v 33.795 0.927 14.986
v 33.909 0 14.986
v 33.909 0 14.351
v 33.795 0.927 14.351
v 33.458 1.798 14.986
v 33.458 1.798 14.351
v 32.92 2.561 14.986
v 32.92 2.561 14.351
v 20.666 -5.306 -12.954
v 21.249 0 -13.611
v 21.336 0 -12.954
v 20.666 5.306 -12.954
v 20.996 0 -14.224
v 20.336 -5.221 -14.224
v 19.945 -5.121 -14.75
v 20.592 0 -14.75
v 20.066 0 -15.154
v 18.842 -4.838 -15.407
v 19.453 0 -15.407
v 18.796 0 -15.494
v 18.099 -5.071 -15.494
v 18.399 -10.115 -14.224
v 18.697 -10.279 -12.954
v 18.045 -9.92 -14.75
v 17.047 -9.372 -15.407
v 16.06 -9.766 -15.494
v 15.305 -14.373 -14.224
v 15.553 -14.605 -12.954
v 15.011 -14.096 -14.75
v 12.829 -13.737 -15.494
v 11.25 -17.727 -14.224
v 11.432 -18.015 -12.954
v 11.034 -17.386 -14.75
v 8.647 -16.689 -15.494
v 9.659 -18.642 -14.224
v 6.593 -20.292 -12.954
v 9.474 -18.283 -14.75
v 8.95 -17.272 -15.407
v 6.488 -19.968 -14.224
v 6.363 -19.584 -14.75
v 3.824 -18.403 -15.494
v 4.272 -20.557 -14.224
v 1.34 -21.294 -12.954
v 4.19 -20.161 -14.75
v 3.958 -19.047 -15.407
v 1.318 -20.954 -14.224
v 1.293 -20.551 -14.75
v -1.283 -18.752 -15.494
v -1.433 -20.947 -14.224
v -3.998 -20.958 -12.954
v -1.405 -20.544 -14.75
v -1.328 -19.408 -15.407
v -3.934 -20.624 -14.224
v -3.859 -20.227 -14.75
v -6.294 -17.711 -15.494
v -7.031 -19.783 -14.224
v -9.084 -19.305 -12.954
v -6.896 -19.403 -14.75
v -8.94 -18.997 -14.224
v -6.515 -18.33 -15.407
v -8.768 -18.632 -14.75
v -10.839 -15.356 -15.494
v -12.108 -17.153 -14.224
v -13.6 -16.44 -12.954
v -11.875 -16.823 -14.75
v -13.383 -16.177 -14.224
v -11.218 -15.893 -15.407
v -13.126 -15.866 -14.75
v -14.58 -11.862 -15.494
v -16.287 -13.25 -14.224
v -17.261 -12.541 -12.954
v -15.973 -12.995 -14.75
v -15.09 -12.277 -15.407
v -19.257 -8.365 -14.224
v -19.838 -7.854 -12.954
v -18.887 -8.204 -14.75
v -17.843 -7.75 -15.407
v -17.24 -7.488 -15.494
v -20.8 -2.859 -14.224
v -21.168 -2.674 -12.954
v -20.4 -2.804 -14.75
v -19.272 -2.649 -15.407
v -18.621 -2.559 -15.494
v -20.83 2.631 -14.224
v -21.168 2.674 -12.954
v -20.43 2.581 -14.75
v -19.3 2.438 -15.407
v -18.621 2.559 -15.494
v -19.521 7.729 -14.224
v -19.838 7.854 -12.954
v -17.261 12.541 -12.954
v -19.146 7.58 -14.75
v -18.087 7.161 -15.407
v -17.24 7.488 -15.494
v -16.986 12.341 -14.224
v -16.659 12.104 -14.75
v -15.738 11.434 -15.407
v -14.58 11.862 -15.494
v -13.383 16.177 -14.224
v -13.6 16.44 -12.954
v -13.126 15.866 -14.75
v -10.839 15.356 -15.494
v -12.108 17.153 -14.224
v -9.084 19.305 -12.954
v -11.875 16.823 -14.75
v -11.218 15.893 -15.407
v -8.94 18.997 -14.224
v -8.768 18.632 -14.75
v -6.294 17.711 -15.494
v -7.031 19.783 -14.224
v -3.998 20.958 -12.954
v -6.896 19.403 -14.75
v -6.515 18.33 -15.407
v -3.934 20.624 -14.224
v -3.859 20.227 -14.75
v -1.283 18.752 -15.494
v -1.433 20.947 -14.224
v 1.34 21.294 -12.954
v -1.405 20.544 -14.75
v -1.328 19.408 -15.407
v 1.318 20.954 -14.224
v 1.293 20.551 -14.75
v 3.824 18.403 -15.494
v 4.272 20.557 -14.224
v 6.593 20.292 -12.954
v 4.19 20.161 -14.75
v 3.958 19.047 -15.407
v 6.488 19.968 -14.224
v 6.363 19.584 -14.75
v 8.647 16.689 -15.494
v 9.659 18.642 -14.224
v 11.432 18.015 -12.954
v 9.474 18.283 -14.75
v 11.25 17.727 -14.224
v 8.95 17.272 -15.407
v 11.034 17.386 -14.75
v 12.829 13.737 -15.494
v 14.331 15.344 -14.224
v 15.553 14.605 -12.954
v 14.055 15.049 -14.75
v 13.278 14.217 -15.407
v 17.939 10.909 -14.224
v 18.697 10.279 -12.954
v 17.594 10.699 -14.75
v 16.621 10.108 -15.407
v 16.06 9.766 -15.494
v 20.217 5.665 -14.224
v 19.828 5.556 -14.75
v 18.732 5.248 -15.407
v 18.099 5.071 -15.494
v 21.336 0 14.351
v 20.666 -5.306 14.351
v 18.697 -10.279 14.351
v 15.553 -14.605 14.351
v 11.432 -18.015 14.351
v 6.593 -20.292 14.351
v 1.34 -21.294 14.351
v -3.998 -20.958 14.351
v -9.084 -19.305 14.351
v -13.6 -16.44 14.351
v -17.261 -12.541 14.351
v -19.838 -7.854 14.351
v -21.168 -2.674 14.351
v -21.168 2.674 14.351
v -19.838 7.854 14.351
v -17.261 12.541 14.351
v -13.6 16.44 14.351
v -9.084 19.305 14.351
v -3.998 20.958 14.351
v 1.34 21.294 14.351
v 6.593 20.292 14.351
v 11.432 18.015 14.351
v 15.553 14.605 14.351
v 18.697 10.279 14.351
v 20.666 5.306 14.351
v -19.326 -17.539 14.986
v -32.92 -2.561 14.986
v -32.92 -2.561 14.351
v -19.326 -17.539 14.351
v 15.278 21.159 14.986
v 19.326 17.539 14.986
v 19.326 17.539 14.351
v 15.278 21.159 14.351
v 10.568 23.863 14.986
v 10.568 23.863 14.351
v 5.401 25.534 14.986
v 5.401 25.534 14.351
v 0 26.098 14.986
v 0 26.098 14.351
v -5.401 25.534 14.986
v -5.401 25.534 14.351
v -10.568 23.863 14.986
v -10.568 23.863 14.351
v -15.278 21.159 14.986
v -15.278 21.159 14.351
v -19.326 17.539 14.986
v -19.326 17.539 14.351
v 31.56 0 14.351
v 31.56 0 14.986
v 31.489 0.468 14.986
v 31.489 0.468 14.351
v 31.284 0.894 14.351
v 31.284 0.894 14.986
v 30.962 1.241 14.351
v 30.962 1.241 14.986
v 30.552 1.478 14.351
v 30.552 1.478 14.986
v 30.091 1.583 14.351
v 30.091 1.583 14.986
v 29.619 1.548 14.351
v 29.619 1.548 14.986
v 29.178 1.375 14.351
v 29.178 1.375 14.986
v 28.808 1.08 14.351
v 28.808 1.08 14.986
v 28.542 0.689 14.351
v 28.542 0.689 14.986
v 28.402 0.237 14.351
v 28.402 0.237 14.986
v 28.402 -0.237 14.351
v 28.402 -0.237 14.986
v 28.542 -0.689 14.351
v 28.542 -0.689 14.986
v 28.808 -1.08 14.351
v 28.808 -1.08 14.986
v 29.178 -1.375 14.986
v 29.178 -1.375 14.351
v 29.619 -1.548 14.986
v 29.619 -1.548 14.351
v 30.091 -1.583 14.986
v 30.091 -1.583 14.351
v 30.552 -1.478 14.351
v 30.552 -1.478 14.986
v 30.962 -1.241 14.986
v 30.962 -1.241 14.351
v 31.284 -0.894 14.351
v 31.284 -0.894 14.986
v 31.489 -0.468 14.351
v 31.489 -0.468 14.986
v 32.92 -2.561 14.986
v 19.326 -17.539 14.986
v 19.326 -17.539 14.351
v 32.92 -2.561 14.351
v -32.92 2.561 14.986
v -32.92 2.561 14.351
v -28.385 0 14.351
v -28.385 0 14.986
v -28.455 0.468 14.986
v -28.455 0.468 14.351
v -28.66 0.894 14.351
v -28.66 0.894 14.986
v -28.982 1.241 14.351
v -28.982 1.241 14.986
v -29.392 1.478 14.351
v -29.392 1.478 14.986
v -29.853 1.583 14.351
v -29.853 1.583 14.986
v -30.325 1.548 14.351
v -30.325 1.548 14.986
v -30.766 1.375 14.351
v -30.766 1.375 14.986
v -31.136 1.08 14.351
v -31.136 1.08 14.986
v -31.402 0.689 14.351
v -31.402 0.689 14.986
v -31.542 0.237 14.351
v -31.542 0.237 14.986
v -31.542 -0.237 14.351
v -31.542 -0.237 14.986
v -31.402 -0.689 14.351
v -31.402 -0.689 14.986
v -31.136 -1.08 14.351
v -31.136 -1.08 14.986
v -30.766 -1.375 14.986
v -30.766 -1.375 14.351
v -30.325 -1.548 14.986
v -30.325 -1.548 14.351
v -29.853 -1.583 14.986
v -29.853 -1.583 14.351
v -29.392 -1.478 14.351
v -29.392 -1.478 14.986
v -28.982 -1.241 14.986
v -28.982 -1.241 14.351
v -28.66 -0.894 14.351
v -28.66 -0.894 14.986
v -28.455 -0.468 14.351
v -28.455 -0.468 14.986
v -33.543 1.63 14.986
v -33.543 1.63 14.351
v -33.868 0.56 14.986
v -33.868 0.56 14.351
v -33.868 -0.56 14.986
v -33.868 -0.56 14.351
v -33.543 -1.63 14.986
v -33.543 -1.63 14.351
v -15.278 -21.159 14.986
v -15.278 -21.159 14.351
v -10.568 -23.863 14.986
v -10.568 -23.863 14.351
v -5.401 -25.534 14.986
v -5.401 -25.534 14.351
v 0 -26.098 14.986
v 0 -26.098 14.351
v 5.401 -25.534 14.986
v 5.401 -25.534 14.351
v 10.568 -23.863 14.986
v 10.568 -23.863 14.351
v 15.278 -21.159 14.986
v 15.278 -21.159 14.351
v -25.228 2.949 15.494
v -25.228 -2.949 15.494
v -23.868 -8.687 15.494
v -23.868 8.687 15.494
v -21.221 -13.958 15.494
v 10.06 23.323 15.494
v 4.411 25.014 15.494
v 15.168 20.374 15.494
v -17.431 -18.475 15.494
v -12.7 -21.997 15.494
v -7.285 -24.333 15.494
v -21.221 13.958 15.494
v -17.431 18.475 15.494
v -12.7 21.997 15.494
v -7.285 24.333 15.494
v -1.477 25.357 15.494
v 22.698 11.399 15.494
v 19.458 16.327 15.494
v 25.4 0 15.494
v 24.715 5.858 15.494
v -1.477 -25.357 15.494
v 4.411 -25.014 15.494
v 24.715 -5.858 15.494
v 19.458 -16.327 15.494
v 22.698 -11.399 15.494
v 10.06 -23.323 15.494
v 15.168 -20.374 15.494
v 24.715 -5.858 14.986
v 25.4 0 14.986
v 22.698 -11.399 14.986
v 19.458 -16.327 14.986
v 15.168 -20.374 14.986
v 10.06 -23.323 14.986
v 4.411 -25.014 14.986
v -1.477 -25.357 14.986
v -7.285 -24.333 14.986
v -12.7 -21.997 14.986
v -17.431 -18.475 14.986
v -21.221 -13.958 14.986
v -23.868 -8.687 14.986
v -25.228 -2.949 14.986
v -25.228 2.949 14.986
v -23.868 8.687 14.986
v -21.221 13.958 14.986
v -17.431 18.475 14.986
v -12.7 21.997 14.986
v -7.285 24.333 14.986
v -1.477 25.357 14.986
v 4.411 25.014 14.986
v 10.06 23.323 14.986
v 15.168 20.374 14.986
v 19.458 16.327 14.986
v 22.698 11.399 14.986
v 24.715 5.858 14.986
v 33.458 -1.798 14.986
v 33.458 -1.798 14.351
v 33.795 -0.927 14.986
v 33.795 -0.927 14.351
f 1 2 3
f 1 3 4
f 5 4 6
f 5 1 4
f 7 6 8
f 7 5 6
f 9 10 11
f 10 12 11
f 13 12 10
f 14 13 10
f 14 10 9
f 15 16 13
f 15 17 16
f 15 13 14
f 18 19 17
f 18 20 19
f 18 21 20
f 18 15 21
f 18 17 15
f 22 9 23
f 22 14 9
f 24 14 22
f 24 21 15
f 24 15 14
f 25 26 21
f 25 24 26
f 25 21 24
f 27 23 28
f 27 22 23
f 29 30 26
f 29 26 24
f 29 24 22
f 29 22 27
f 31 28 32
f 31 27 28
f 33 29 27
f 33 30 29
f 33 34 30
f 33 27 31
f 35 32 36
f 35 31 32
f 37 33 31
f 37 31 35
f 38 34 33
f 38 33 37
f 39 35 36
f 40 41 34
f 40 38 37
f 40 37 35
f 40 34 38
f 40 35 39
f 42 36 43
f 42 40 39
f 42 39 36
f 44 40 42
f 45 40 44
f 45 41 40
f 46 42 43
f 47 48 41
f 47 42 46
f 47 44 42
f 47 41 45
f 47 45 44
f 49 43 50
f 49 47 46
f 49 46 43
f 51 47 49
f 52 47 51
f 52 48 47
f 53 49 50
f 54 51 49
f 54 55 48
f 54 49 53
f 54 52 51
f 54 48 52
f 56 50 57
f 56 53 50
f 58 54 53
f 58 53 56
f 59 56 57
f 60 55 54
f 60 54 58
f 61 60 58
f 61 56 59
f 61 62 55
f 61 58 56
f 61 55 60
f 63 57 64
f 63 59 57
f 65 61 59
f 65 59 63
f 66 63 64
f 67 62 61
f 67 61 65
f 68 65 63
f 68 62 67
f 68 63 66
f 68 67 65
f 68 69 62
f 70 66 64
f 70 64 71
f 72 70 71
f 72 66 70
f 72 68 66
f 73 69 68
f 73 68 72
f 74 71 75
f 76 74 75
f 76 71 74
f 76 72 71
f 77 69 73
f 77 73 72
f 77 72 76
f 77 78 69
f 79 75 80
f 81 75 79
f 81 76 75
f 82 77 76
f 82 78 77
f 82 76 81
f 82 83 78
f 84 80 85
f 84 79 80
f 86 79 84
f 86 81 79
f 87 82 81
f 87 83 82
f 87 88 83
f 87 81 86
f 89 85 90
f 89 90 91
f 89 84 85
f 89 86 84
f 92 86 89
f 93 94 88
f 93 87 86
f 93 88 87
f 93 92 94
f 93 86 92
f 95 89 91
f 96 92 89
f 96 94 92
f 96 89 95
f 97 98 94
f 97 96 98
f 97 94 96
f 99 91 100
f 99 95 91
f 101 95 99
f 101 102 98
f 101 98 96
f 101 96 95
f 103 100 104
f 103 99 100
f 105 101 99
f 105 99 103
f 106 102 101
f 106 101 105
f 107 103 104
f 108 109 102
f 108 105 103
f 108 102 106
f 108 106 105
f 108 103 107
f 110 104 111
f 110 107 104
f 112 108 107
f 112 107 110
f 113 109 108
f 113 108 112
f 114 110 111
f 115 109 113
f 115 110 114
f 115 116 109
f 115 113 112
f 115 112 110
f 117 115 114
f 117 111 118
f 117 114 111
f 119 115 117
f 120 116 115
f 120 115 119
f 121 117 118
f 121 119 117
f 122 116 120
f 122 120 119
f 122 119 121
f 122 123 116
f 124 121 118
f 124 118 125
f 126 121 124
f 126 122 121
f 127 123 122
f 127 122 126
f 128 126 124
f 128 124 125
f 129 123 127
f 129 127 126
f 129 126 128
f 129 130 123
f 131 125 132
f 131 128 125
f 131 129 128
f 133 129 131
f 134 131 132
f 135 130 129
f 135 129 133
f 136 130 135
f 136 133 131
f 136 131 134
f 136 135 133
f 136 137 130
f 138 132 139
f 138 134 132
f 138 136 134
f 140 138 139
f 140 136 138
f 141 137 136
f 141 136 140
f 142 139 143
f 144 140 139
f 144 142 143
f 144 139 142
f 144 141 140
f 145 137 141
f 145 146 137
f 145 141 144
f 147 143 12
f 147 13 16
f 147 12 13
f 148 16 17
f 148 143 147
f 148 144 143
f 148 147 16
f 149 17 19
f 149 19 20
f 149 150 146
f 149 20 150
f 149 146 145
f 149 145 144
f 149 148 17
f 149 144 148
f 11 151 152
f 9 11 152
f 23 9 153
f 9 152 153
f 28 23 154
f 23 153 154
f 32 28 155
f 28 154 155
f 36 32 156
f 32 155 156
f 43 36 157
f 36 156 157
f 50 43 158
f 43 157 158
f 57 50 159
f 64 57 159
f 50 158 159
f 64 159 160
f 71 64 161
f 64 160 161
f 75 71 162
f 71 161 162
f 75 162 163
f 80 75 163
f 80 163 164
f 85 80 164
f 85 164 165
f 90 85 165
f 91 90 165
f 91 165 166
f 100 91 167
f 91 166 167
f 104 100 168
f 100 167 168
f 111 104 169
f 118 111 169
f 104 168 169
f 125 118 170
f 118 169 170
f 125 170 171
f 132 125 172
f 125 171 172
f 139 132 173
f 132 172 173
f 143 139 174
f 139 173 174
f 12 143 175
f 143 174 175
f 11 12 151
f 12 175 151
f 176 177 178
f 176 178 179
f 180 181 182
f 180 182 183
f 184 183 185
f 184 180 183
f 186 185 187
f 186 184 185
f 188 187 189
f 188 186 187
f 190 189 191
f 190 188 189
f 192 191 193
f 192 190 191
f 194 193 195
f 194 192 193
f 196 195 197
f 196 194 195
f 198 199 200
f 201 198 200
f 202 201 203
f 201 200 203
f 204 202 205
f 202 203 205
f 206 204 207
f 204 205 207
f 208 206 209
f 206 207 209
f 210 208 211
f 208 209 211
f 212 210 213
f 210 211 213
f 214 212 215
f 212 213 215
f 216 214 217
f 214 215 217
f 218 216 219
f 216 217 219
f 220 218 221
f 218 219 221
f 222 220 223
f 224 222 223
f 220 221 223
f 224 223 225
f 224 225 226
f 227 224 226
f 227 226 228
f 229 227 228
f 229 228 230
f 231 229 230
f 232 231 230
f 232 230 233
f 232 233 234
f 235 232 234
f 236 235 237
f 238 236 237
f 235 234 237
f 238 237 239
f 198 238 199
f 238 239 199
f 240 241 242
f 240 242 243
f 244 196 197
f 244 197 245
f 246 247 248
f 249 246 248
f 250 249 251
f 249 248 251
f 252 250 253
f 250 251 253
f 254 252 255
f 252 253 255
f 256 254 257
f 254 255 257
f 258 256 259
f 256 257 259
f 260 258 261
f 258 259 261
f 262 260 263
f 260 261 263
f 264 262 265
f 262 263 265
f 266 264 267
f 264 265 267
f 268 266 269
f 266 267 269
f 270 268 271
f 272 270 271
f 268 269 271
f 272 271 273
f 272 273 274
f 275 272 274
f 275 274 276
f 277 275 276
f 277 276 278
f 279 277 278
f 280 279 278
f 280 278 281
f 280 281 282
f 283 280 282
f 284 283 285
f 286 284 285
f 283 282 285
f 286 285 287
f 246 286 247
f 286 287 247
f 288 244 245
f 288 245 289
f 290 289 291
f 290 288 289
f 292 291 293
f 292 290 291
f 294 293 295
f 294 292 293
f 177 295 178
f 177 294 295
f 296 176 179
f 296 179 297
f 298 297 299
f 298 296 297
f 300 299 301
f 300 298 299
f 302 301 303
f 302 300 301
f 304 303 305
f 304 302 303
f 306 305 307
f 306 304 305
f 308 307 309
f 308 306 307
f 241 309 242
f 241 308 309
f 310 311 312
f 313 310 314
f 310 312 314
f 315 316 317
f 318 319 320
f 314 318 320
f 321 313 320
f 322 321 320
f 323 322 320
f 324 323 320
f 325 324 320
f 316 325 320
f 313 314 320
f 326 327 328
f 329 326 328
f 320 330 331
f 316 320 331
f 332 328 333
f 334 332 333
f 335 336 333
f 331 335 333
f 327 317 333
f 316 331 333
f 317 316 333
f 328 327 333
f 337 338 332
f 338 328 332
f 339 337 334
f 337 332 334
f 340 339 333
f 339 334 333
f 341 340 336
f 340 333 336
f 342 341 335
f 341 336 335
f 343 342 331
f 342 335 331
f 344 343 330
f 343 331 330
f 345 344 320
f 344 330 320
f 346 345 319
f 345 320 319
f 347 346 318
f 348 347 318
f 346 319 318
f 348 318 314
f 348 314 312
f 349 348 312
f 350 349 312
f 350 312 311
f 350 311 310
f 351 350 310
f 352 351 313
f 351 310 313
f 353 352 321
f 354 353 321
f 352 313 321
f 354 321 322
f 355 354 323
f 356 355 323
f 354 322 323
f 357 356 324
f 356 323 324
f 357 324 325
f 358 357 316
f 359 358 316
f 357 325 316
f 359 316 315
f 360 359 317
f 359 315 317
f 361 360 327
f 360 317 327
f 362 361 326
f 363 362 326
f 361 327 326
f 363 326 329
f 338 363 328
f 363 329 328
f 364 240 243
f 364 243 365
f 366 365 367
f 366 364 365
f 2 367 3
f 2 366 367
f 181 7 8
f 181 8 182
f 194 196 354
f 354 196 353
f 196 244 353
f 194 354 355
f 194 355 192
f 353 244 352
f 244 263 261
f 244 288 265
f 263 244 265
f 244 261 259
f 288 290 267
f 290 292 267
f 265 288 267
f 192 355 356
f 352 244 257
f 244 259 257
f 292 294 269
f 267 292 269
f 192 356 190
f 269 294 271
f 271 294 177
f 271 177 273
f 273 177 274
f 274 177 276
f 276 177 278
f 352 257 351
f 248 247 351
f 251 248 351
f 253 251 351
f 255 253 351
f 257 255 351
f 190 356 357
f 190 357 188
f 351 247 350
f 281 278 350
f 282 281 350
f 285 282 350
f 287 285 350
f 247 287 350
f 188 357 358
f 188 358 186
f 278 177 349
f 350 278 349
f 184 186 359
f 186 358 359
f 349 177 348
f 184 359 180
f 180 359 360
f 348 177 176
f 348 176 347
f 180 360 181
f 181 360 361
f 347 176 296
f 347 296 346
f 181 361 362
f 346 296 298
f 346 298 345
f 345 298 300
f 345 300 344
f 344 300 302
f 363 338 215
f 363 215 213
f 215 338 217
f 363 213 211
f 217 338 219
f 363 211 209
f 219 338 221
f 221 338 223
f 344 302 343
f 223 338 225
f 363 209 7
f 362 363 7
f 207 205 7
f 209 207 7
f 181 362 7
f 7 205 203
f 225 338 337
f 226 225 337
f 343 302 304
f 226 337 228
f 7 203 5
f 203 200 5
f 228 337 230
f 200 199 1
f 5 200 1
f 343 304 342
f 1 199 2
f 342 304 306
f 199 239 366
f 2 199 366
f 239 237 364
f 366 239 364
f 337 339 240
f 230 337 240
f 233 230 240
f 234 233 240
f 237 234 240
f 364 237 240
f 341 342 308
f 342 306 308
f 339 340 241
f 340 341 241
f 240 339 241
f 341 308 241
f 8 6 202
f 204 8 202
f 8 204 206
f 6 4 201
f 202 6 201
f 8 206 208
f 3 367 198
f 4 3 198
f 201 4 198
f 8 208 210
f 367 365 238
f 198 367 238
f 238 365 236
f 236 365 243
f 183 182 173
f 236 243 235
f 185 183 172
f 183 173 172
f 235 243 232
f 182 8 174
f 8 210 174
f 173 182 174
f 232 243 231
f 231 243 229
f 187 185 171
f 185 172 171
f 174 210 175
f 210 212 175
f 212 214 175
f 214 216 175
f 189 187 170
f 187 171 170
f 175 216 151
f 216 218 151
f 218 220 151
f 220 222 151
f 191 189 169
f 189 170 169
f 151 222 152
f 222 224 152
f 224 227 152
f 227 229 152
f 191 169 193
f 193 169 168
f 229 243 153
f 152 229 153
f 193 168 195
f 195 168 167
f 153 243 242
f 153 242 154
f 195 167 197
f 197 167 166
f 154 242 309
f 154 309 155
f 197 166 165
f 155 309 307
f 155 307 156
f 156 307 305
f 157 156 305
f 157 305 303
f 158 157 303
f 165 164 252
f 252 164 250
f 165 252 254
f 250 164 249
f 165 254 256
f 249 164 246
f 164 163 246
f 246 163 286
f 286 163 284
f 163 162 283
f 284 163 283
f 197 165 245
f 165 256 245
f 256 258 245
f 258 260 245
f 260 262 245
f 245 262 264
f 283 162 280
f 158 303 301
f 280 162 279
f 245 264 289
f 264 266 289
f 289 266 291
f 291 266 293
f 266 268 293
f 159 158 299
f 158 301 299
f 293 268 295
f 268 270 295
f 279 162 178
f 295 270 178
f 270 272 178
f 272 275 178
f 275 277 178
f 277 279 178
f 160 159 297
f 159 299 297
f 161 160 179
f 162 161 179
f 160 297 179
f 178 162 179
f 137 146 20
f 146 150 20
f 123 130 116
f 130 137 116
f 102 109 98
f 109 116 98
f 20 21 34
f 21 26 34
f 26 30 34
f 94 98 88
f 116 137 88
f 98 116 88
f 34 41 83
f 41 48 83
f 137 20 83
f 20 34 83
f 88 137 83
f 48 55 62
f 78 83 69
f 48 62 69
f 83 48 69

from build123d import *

# Parameters (mm, degrees)
F2_R     = 1.5875
F3_DEPTH = 0.635
F4_R     = 2.54


with BuildPart() as f1:
    # F0 (on Front) → F1 (revolve)
    with BuildSketch(Plane.XZ):
        Polygon((26.0985, 14.351), (26.0985, 14.986), (25.4, 14.986), (25.4, 15.494), (0, 15.494), (0, -15.494), (21.336, -15.494), (21.336, 14.351), align=None)
    revolve(axis=Axis((0, 0, -4.175231), (0, 0, -1)))

    # F2 (on face) → F3 (join, through all)
    with BuildSketch(Plane.XY.offset(14.986)):
        with BuildLine():
            ThreePointArc((19.326104, -17.539481), (24.346602, -9.400781), (26.0985, 0))
            ThreePointArc((26.0985, 0), (24.346602, 9.400781), (19.326104, 17.539481))
            ThreePointArc((19.326104, 17.539481), (0, 26.0985), (-19.326104, 17.539481))
            ThreePointArc((-19.326104, 17.539481), (-26.0985, 0), (-19.326104, -17.539481))
            ThreePointArc((-19.326104, -17.539481), (0, -26.0985), (19.326104, -17.539481))
        make_face()
        with BuildLine():
            ThreePointArc((19.326104, 17.539481), (24.346602, 9.400781), (26.0985, 0))
            ThreePointArc((26.0985, 0), (24.346602, -9.400781), (19.326104, -17.539481))
            Line((19.326104, -17.539481), (32.920329, -2.560508))
            ThreePointArc((32.920329, -2.560508), (26.289, 0), (32.920329, 2.560508))
            Line((32.920329, 2.560508), (19.326104, 17.539481))
        make_face()
        with BuildLine():
            ThreePointArc((-19.326104, -17.539481), (-26.0985, 0), (-19.326104, 17.539481))
            Line((-19.326104, 17.539481), (-32.920329, 2.560508))
            ThreePointArc((-32.920329, 2.560508), (-28.726623, 3.554248), (-26.289, 0))
            ThreePointArc((-26.289, 0), (-28.726623, -3.554248), (-32.920329, -2.560508))
            Line((-32.920329, -2.560508), (-19.326104, -17.539481))
        make_face()
        with BuildLine():
            ThreePointArc((33.909, 0), (33.653248, 1.372377), (32.920329, 2.560508))
            ThreePointArc((32.920329, 2.560508), (26.289, 0), (32.920329, -2.560508))
            ThreePointArc((32.920329, -2.560508), (33.653248, -1.372377), (33.909, 0))
        make_face()
        with Locations((29.972, 0)):
            Circle(F2_R, mode=Mode.SUBTRACT)
        with BuildLine():
            ThreePointArc((-26.289, 0), (-28.726623, 3.554248), (-32.920329, 2.560508))
            ThreePointArc((-32.920329, 2.560508), (-33.909, 0), (-32.920329, -2.560508))
            ThreePointArc((-32.920329, -2.560508), (-28.726623, -3.554248), (-26.289, 0))
        make_face()
        with Locations((-29.972, 0)):
            Circle(F2_R, mode=Mode.SUBTRACT)
    extrude(amount=-F3_DEPTH)

    # F4
    f4_edges = [f1.edges().sort_by_distance(p)[0] for p in [
        (-21.336, 0, -15.494),
    ]]
    fillet(f4_edges, radius=F4_R)


solid = f1.part
